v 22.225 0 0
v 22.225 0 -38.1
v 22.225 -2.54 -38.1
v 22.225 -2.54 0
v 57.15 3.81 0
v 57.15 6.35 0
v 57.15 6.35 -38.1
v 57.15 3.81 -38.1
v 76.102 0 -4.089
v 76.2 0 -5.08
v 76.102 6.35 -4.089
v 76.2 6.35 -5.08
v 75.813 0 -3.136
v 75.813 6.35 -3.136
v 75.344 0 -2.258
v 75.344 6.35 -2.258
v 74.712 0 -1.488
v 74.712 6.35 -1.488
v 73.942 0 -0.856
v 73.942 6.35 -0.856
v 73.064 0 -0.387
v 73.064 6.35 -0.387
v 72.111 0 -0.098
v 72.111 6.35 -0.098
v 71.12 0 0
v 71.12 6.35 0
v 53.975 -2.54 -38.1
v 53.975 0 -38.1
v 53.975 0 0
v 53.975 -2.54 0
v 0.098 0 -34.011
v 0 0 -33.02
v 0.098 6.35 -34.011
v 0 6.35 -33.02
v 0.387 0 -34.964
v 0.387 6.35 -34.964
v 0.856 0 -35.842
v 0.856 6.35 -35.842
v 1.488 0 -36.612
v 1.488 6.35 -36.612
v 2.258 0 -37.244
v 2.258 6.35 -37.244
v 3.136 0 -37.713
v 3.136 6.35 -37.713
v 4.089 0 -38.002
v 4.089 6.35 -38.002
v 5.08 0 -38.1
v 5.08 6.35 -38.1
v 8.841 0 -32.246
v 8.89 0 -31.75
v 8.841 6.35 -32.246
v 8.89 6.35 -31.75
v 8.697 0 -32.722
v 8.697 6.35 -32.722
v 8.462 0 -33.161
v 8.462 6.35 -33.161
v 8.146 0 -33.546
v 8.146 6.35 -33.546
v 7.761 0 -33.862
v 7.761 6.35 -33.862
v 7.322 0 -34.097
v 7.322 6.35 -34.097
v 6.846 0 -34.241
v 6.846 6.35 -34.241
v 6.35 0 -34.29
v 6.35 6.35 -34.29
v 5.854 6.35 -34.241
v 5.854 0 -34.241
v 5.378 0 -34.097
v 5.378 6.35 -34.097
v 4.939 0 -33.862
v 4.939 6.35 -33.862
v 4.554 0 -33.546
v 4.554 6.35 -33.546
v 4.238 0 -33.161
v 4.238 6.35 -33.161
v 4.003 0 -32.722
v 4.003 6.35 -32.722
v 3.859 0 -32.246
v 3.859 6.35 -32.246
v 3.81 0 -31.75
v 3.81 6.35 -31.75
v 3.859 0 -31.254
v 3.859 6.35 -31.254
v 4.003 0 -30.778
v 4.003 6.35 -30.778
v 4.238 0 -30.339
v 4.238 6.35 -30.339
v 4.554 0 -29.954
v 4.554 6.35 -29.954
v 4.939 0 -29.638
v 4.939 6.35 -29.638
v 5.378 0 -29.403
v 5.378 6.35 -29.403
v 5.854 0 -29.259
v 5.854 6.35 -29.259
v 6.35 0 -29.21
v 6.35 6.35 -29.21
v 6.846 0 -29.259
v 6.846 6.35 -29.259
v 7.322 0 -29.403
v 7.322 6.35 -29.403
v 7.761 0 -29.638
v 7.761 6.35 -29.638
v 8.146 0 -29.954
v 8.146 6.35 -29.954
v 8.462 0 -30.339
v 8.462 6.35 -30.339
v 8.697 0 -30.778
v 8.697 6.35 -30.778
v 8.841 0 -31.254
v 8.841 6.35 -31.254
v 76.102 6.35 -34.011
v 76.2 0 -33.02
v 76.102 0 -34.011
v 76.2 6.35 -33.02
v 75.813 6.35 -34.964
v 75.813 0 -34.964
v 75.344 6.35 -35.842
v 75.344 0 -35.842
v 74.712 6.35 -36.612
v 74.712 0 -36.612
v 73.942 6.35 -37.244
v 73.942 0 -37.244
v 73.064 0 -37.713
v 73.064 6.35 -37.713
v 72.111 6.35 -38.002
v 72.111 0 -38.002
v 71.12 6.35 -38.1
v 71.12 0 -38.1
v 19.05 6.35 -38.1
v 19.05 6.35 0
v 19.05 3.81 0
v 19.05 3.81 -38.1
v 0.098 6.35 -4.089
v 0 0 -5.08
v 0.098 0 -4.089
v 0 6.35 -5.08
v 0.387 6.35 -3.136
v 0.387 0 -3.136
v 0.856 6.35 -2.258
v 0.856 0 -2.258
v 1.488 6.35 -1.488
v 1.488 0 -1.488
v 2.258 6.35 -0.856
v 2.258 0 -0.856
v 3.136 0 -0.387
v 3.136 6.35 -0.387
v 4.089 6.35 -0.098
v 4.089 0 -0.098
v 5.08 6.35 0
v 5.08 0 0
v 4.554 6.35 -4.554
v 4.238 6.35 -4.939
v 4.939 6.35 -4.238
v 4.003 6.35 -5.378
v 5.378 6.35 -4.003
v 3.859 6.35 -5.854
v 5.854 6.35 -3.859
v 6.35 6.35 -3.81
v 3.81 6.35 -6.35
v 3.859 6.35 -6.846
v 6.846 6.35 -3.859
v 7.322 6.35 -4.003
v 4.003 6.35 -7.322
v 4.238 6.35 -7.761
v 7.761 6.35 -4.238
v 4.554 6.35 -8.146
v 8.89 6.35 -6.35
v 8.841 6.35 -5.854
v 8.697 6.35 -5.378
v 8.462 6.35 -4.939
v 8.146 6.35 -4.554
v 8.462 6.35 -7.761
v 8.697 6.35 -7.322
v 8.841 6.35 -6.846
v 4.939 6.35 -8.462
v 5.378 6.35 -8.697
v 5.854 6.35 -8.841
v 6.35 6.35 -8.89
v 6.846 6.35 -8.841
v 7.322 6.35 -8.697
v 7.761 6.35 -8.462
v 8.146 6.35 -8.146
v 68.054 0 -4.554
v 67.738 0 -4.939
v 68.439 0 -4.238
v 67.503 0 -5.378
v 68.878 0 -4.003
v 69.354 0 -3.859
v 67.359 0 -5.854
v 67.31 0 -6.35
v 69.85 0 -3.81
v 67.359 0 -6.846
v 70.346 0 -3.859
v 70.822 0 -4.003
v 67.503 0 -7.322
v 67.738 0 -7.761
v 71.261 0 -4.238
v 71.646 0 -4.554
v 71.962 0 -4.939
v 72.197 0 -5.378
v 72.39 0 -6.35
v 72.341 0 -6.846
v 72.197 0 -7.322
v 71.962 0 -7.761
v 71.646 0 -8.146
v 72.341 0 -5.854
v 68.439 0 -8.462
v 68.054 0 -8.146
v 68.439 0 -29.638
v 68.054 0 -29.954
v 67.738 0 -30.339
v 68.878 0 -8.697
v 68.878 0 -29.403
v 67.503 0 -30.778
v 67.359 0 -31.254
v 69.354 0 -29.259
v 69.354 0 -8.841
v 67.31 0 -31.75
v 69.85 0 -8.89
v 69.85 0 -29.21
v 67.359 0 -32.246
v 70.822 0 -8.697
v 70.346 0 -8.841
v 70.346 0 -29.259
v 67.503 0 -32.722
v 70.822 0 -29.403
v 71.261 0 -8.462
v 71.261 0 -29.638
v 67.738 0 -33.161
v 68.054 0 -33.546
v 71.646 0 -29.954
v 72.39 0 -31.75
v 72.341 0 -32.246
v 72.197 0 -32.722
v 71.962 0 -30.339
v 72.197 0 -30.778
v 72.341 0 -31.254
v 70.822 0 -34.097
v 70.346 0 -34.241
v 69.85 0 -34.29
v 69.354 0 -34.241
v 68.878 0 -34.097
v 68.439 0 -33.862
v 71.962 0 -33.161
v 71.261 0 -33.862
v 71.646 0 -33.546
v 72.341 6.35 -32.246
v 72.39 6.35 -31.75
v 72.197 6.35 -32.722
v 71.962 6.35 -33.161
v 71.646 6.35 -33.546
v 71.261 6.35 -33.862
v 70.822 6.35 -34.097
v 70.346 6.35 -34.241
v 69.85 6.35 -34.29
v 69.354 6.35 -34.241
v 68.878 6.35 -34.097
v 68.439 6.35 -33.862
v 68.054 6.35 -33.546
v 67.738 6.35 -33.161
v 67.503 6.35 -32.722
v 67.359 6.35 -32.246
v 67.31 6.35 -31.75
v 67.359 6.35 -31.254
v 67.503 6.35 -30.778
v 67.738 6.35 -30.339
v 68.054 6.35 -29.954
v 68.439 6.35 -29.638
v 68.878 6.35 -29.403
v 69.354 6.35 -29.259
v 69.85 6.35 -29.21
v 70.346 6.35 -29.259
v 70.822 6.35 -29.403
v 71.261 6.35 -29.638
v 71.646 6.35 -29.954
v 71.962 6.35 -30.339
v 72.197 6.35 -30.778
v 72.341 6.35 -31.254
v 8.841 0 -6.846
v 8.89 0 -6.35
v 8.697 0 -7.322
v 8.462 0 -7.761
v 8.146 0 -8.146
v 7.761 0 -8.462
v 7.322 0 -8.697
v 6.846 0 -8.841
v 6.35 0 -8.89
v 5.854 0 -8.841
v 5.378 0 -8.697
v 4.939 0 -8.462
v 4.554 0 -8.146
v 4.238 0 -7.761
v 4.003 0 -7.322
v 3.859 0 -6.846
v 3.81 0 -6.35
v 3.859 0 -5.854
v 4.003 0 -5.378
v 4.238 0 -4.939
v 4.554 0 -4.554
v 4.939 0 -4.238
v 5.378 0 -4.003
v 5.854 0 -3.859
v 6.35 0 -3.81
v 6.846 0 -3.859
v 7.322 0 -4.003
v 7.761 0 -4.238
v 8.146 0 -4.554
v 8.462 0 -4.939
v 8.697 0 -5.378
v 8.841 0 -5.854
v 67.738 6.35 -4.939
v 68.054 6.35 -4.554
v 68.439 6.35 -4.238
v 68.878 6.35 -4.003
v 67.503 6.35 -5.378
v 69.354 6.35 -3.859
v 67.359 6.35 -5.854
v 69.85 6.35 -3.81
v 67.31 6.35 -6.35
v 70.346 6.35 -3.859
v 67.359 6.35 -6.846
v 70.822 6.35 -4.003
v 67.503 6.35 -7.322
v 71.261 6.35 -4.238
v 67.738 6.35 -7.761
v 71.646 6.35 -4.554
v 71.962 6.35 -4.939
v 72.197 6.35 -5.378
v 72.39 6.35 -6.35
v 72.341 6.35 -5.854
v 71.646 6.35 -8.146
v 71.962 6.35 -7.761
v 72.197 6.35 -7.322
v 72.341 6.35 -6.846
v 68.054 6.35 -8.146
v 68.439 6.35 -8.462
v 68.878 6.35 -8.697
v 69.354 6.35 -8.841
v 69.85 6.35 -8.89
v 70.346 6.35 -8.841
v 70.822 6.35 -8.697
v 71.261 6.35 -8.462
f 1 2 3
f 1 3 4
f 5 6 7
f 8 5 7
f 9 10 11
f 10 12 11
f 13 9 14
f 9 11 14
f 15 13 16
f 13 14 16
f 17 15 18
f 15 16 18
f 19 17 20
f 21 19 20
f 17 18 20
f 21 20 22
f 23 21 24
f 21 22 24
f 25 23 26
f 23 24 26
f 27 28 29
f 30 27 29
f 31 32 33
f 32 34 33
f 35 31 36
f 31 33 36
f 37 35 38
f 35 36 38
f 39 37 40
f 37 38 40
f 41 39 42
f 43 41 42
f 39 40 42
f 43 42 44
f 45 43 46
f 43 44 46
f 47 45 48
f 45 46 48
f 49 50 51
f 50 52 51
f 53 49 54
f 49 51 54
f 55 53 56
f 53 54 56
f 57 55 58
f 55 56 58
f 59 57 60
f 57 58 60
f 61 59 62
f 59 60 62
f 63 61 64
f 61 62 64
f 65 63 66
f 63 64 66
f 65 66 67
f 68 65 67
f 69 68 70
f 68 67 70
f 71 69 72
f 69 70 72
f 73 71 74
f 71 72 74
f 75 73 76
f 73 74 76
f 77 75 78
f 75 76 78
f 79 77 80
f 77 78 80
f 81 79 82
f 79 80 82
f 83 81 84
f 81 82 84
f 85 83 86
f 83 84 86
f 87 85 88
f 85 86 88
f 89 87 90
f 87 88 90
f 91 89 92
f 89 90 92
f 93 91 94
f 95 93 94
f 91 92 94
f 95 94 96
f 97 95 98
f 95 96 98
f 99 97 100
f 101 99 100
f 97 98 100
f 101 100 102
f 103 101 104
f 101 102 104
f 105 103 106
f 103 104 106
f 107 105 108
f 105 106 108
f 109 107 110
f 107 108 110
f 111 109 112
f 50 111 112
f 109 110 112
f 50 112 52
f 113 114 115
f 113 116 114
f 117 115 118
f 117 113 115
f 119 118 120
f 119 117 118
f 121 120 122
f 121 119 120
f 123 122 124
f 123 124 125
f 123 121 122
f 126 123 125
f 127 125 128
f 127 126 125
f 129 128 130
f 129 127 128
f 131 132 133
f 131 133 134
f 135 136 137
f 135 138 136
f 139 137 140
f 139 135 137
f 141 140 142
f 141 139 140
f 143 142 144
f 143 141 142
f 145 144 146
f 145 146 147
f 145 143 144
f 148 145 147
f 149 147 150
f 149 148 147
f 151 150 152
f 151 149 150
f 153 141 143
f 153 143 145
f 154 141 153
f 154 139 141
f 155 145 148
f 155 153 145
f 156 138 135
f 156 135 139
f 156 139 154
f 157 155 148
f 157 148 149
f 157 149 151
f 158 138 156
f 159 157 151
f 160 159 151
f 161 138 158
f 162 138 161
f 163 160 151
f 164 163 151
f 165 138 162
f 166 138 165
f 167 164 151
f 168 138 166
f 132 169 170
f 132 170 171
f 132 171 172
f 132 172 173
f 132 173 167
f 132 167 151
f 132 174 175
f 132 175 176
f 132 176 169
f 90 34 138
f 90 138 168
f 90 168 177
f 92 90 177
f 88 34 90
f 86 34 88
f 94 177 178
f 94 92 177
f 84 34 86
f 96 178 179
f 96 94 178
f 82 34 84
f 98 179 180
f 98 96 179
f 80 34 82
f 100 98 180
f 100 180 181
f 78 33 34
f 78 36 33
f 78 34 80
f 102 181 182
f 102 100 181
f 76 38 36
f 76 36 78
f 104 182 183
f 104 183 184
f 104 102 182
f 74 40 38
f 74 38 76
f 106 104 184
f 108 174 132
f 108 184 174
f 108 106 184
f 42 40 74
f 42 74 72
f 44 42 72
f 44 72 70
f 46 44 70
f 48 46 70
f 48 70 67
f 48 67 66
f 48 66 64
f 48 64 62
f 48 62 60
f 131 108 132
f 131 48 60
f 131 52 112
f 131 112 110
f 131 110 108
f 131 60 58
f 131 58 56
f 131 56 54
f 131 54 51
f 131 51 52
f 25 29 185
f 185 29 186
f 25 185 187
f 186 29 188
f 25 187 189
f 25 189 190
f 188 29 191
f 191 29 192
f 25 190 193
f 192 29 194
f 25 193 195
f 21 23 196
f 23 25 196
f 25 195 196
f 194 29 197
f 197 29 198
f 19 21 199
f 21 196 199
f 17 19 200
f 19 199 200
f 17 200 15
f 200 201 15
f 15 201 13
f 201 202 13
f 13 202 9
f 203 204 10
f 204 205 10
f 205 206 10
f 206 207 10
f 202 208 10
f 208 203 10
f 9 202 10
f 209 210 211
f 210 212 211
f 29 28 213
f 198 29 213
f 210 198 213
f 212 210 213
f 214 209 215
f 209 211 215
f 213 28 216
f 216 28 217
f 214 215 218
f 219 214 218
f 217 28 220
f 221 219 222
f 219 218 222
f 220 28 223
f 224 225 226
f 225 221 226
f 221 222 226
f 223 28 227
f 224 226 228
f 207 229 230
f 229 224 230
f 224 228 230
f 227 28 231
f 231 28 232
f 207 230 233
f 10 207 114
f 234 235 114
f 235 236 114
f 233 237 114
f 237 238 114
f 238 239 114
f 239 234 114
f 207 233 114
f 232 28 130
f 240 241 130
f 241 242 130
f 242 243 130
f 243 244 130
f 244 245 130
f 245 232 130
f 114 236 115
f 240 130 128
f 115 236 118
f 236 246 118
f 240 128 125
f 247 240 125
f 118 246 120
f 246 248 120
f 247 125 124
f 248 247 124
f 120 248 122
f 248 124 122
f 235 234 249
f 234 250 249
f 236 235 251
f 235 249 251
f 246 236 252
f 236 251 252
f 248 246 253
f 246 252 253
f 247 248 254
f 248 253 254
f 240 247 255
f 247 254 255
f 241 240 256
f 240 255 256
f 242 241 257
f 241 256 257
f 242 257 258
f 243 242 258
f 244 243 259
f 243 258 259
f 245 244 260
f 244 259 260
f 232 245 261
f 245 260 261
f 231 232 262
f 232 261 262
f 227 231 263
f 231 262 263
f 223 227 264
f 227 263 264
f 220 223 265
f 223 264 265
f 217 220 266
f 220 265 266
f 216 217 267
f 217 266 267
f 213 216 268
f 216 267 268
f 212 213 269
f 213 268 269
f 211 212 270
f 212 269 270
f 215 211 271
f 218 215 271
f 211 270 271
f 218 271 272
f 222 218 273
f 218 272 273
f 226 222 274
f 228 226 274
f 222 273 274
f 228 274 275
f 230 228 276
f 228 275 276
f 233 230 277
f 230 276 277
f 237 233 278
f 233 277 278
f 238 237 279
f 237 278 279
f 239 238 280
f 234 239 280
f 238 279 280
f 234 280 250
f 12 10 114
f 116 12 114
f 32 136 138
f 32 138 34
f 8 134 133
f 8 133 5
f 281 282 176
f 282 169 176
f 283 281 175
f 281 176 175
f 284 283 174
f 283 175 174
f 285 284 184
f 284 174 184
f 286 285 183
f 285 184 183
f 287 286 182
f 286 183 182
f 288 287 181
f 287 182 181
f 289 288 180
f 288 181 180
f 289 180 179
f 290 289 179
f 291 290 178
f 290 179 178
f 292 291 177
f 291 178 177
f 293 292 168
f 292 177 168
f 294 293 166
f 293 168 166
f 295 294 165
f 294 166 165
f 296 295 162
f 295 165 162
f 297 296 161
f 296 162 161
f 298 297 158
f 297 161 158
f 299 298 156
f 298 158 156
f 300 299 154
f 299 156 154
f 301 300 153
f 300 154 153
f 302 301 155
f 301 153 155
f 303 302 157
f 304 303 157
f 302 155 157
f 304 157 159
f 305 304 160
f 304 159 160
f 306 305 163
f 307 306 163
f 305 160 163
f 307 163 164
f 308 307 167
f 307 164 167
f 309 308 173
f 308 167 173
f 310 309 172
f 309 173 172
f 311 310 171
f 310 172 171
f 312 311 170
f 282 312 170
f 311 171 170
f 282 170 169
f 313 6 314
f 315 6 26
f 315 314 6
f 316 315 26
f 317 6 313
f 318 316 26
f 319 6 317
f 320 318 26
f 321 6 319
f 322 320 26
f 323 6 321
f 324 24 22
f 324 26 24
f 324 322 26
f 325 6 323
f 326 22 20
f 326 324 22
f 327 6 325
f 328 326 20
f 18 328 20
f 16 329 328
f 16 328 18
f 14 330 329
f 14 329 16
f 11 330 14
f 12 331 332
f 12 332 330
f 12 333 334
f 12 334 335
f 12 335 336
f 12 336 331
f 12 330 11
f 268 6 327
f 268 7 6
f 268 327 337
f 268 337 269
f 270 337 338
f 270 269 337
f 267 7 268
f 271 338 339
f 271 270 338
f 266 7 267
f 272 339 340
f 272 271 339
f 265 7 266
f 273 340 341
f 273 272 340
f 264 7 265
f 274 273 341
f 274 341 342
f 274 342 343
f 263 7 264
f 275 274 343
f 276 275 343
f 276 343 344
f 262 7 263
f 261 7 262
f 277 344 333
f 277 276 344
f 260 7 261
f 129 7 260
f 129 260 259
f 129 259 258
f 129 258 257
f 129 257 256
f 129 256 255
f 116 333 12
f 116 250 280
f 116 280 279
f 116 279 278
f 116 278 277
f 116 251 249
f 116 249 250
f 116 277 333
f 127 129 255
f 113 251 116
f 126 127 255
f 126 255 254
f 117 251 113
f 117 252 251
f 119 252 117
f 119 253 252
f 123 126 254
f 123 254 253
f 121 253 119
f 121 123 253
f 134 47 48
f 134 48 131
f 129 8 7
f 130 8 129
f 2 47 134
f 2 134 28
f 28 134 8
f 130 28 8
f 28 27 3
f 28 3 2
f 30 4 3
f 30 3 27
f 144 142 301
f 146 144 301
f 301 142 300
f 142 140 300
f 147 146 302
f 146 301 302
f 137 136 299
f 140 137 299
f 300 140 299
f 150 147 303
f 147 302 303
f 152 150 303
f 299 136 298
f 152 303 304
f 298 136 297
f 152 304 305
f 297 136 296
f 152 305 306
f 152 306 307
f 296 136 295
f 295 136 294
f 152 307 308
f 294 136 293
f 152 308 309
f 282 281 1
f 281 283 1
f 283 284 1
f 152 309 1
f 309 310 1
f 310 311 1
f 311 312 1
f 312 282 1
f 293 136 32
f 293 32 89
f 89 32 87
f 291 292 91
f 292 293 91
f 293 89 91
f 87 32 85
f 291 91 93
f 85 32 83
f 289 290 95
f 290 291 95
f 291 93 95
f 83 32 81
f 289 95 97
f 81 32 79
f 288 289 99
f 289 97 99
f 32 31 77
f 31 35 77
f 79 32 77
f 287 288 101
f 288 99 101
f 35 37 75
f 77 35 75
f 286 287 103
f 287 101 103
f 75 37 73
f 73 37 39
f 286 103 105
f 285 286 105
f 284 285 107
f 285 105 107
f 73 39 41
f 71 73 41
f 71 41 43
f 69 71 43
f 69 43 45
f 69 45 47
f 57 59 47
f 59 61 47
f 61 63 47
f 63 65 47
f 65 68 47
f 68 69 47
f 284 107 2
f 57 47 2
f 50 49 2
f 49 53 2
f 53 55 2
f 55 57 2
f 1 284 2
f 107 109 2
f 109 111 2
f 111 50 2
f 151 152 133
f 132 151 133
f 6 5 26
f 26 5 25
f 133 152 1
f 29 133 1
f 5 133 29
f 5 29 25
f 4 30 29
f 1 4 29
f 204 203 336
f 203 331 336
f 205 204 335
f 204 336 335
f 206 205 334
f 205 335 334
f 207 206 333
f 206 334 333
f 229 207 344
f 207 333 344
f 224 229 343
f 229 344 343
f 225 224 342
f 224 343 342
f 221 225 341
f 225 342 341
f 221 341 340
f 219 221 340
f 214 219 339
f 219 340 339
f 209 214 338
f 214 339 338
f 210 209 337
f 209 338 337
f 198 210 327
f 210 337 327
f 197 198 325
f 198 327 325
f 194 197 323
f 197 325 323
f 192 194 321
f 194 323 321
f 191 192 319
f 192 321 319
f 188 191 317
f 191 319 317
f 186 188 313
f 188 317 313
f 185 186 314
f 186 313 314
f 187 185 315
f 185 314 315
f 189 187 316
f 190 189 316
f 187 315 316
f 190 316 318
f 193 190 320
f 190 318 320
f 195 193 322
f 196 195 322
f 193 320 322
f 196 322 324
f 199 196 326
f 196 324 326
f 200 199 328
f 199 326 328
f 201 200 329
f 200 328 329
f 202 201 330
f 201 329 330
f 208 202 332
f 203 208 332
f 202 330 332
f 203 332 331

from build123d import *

# Parameters (mm, degrees)
SKETCH1_W               = 76.2
SKETCH1_H               = 38.1
BOSS_EXTRUDE3_DEPTH     = 6.35
SKETCH3_W               = 38.1
SKETCH3_H               = 38.1
CUT_EXTRUDE1_DEPTH      = 2.54
SKETCH4_W               = 31.75
SKETCH4_H               = 38.1
BOSS_EXTRUDE4_DEPTH     = 2.54
SKETCH5_R               = 2.54
CUT_EXTRUDE5_DEPTH      = 6.35
CUT_EXTRUDE5_DEPTH_BACK = 6.35
FILLET1_R               = 5.08


with BuildPart() as part:
    # Sketch1 → Boss-Extrude3 (new body)
    with BuildSketch(Plane(origin=(0, 0, 0), x_dir=(1, 0, 0), z_dir=(0, 1, 0))):
        with Locations((38.1, 19.05)):
            Rectangle(SKETCH1_W, SKETCH1_H)
    extrude(amount=BOSS_EXTRUDE3_DEPTH)

    # Sketch3 → Cut-Extrude1 (cut)
    with BuildSketch(Plane(origin=(0, 6.35, 0), x_dir=(1, 0, 0), z_dir=(0, 1, 0))):
        with Locations((38.1, 19.05)):
            Rectangle(SKETCH3_W, SKETCH3_H)
    extrude(amount=-CUT_EXTRUDE1_DEPTH, mode=Mode.SUBTRACT)

    # Sketch4 → Boss-Extrude4 (add)
    with BuildSketch(Plane.XZ):
        with Locations((38.1, -19.05)):
            Rectangle(SKETCH4_W, SKETCH4_H)
    extrude(amount=BOSS_EXTRUDE4_DEPTH)

    # Sketch5 → Cut-Extrude5 (cut, two sides)
    with BuildSketch(Plane(origin=(0, 3.81, 0), x_dir=(1, 0, 0), z_dir=(0, 1, 0))) as cut_extrude5_sk:
        with Locations((6.35, 31.75)):
            Circle(SKETCH5_R)
        with Locations((6.35, 6.35)):
            Circle(SKETCH5_R)
        with Locations((69.85, 31.75)):
            Circle(SKETCH5_R)
        with Locations((69.85, 6.35)):
            Circle(SKETCH5_R)
    extrude(amount=CUT_EXTRUDE5_DEPTH, mode=Mode.SUBTRACT)
    extrude(cut_extrude5_sk.sketch, amount=-CUT_EXTRUDE5_DEPTH_BACK, mode=Mode.SUBTRACT)

    # Fillet1
    fillet1_edges = [part.edges().sort_by_distance(p)[0] for p in [
        (0, 3.175, -38.1),
        (0, 3.175, 0),
        (76.2, 3.175, 0),
        (76.2, 3.175, -38.1),
    ]]
    fillet(fillet1_edges, radius=FILLET1_R)


solid = part.part
